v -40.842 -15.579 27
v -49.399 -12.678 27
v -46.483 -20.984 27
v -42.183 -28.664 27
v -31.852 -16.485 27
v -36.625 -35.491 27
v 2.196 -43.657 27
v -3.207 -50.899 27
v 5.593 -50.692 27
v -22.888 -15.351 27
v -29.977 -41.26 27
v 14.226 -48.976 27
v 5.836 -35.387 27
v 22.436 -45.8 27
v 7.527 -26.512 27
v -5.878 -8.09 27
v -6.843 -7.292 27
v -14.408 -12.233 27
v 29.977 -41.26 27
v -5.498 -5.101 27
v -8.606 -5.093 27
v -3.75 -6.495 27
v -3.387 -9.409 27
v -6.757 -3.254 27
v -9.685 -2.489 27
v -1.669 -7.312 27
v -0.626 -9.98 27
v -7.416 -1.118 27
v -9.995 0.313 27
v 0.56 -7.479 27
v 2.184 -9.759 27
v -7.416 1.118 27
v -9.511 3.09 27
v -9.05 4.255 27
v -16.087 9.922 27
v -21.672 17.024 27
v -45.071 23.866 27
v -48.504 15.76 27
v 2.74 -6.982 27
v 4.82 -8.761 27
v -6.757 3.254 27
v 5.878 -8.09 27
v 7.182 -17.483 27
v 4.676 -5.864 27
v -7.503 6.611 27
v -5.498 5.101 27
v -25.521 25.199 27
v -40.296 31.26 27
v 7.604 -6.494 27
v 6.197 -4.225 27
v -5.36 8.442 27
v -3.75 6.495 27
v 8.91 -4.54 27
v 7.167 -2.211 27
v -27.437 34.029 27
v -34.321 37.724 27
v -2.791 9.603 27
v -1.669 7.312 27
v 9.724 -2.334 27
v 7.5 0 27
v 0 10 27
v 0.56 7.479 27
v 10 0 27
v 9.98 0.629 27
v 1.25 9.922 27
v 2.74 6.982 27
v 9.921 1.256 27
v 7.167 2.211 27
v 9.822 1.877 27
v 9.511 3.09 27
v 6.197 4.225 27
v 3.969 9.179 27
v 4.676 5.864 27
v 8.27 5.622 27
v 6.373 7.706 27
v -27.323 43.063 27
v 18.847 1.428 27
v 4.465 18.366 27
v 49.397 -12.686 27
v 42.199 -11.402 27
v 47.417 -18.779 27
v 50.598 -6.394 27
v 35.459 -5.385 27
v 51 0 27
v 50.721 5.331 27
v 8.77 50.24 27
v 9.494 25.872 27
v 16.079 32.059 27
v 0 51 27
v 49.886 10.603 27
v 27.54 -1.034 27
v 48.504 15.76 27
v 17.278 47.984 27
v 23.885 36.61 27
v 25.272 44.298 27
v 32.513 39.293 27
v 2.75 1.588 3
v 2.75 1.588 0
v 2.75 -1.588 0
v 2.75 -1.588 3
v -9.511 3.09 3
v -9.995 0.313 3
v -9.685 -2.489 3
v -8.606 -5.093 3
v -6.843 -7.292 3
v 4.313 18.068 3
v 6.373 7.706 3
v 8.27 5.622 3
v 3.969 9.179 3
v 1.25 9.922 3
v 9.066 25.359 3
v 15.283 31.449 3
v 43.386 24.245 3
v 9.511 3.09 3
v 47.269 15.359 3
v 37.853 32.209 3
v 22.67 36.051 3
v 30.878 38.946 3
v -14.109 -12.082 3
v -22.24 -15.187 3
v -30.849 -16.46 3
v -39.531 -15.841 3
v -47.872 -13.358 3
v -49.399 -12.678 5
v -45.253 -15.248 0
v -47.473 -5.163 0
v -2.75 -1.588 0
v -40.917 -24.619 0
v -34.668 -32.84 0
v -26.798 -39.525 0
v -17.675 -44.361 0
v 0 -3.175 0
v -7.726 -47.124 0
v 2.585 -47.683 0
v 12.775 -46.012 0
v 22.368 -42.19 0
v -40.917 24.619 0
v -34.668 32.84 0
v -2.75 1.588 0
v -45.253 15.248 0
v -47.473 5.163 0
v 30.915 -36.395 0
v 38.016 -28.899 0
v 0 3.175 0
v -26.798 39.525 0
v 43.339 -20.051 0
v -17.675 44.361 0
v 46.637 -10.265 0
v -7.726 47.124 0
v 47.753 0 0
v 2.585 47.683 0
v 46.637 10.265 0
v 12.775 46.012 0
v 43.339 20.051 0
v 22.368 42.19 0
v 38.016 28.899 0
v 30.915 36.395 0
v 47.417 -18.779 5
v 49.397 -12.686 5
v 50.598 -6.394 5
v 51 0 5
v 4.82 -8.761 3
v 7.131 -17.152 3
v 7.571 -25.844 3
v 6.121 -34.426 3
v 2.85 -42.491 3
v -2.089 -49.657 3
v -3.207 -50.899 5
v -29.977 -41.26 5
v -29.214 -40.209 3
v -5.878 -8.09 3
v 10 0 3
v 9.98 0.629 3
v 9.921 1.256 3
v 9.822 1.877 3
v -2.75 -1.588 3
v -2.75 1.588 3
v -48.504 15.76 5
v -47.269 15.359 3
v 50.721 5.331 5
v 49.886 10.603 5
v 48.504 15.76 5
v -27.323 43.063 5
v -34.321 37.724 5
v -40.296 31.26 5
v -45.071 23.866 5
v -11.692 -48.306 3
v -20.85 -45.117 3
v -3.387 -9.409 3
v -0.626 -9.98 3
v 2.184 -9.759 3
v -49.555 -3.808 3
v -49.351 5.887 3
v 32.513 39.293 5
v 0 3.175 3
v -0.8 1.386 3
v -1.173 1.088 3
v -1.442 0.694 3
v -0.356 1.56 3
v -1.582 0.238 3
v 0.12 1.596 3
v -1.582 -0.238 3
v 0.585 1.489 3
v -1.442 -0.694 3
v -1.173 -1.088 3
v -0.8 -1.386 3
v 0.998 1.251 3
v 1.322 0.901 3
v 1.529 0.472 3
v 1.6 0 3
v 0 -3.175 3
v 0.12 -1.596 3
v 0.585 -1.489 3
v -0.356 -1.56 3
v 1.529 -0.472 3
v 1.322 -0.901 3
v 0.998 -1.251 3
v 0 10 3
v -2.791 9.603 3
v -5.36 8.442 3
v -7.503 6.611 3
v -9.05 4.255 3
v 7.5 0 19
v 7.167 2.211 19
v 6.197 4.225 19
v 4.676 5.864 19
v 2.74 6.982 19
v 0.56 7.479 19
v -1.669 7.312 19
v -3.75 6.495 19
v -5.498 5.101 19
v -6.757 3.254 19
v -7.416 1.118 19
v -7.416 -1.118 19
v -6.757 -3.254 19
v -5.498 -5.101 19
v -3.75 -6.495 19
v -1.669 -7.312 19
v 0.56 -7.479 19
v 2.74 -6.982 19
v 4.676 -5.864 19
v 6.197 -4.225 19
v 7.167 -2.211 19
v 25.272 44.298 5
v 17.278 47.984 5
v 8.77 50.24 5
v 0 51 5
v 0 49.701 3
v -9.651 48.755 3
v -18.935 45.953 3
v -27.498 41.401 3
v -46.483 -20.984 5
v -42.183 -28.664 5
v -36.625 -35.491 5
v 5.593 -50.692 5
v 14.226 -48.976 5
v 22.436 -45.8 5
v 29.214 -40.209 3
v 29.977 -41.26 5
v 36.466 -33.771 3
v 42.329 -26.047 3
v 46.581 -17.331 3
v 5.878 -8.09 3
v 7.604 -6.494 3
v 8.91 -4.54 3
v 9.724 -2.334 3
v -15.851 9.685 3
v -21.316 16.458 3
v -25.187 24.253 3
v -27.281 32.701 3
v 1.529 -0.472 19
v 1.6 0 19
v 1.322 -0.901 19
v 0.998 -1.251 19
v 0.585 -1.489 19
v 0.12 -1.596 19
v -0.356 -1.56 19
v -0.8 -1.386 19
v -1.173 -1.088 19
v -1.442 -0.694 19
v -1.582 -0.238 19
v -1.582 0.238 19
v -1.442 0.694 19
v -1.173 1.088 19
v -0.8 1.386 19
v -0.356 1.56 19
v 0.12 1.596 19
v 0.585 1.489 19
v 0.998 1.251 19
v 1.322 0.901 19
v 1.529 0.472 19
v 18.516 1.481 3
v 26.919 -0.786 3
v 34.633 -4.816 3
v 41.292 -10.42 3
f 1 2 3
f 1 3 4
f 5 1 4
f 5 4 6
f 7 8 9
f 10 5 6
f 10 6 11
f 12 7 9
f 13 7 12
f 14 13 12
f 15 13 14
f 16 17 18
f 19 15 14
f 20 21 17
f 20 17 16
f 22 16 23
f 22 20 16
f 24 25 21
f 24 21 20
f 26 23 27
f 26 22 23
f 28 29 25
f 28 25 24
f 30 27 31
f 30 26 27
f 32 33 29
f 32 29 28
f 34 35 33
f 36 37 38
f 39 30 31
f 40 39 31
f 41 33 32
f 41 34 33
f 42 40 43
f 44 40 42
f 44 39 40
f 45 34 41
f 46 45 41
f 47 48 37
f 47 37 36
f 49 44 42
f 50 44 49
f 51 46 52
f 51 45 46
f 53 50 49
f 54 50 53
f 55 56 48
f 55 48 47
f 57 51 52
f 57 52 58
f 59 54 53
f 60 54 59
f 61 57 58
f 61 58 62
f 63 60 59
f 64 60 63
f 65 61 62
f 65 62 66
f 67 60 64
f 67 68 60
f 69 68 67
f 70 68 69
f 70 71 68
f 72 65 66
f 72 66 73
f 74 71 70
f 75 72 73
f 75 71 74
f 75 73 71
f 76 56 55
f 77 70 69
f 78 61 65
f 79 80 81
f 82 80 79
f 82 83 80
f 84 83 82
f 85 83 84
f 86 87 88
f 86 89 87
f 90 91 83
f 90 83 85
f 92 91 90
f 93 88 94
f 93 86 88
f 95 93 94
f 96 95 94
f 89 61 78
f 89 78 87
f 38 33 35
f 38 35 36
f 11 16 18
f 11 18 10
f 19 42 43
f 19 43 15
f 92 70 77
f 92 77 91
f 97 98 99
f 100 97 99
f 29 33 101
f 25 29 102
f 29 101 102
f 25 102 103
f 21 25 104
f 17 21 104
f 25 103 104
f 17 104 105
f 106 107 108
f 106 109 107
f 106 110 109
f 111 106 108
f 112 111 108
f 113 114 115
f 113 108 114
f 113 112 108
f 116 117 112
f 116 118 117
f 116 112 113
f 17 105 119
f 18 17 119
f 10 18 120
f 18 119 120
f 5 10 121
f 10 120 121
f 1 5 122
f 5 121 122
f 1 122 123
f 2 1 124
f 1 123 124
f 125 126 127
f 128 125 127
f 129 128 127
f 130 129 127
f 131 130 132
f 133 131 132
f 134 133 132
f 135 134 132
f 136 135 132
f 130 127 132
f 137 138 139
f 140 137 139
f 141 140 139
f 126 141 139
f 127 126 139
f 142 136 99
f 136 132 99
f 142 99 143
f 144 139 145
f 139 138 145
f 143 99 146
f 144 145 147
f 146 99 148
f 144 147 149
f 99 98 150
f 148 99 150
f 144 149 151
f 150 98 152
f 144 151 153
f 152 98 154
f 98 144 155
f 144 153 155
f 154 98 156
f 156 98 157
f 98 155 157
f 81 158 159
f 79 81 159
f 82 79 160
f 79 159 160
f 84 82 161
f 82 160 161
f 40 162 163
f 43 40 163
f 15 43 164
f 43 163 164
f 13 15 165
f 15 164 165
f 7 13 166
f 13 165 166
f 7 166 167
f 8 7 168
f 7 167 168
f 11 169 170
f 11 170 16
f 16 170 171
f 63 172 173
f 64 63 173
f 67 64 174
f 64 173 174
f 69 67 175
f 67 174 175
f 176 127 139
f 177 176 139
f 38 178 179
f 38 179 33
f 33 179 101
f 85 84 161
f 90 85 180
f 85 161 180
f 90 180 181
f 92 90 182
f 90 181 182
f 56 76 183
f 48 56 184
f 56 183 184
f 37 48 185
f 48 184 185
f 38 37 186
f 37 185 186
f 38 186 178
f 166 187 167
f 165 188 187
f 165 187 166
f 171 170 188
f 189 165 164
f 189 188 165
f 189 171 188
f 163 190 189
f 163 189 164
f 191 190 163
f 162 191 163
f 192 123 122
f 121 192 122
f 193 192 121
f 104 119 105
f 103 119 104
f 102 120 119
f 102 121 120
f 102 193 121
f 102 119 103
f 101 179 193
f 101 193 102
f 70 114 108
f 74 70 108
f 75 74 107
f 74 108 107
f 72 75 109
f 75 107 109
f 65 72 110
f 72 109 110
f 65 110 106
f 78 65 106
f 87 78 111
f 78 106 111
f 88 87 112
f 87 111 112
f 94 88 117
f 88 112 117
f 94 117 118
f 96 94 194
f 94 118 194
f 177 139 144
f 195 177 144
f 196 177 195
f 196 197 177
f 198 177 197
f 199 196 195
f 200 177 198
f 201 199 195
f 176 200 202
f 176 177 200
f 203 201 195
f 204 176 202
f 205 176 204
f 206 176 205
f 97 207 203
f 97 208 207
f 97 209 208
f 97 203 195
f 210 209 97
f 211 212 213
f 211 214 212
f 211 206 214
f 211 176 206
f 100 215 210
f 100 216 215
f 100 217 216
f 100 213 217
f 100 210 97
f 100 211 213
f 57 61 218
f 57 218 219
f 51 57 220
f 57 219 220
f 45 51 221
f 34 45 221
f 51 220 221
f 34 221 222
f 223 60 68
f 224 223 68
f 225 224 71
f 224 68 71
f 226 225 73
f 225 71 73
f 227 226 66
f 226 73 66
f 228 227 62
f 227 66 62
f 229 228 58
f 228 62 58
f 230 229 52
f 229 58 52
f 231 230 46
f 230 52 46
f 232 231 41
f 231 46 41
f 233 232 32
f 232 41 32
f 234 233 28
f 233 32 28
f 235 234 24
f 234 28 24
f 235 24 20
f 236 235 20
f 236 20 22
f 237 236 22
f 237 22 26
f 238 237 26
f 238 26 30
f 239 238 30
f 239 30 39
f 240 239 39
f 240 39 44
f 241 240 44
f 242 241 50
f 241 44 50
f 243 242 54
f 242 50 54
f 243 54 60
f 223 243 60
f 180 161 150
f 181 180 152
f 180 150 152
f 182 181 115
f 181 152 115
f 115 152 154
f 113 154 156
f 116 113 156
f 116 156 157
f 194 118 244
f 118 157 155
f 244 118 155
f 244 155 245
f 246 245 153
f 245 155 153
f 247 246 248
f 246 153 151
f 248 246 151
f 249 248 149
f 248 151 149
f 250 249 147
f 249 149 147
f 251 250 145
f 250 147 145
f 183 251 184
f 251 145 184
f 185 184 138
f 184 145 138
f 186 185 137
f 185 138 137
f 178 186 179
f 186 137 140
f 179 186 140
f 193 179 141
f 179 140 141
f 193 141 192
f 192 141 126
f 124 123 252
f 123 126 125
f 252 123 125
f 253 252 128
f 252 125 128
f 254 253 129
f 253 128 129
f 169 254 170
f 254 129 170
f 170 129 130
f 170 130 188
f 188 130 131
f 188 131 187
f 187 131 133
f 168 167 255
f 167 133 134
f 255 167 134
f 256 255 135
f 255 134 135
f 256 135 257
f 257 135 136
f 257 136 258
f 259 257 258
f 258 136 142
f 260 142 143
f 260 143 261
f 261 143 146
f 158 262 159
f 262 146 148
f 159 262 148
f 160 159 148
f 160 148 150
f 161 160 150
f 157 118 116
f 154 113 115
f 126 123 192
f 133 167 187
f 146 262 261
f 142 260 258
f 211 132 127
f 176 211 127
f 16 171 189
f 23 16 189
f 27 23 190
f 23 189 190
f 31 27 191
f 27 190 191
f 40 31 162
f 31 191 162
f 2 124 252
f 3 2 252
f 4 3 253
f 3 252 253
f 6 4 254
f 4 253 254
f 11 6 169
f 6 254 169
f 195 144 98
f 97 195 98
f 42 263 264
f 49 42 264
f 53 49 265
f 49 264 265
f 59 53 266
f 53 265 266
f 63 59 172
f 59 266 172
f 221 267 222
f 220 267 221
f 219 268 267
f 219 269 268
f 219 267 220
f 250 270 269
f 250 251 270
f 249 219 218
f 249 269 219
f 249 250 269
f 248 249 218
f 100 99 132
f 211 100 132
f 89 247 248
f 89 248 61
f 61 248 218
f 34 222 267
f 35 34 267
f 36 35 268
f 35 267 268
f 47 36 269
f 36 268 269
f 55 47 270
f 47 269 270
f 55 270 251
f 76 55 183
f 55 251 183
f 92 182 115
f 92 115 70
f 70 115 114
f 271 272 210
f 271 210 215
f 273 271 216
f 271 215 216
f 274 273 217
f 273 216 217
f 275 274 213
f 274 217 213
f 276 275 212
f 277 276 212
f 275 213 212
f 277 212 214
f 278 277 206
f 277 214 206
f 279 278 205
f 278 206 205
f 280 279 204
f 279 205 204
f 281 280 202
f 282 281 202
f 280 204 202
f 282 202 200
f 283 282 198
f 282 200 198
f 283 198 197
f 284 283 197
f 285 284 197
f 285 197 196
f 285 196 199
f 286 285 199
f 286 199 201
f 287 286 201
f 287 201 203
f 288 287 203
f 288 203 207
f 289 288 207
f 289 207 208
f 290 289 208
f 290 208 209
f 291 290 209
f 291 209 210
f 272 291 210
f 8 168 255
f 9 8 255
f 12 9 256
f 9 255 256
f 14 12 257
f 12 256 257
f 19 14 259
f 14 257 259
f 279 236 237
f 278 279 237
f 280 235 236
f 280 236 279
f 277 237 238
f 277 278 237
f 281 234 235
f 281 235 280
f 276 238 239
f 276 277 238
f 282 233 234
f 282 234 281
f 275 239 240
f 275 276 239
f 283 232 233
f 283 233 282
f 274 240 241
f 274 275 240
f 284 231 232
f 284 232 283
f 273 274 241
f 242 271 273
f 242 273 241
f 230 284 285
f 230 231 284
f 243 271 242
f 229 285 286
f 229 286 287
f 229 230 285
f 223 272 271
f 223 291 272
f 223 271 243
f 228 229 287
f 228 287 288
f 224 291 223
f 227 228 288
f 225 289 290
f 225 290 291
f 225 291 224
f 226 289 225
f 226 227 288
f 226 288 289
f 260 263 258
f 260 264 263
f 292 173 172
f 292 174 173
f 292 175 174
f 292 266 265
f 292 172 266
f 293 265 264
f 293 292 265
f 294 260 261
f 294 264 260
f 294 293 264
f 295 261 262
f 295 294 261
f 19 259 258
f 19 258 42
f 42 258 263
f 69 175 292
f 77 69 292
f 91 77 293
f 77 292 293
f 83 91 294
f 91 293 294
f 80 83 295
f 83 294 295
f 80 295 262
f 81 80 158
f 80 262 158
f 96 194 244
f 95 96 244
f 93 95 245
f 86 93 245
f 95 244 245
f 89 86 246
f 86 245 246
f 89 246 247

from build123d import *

# Parameters (mm, degrees)
F0_R     = 51
F1_DEPTH = 3
F3_DEPTH = 24
F5_DEPTH = 3
F6_R     = 1.6
F7_DEPTH = 24.001
F8_R     = 7.5
F9_DEPTH = 8


# Not quite as in the source:
# - a fillet or chamfer that OpenCascade refuses, or shapes differently, is made with other operations: its cross-section is extruded or revolved along the edge and cut away or added


with BuildPart() as f1:
    # F0 (on Top) → F1 (new body)
    with BuildSketch(Plane.XY):
        Circle(F0_R)
    extrude(amount=F1_DEPTH)

    # F2 (on face) → F3 (join)
    with BuildSketch(Plane.XY.offset(3)):
        with BuildLine():
            Line((0, 51), (0, 10))
            ThreePointArc((0, 10), (0.6262291254, 9.9803725924), (1.25, 9.9215674165))
            ThreePointArc((1.25, 9.9215674165), (12.6111994349, 29.1522486886), (32.5125, 39.2929681209))
            ThreePointArc((32.5125, 39.2929681209), (17.2780008368, 47.9840670127), (0, 51))
        make_face()
        with BuildLine():
            Line((48.5038823311, 15.7598667131), (9.510565163, 3.0901699437))
            ThreePointArc((9.510565163, 3.0901699437), (9.6854138312, 2.4885254508), (9.8222425863, 1.8771122972))
            ThreePointArc((9.8222425863, 1.8771122972), (31.6225110248, -2.9854231318), (47.4167484056, -18.7790300773))
            ThreePointArc((47.4167484056, -18.7790300773), (50.0961783407, -9.5589181217), (51, 0))
            ThreePointArc((51, 0), (50.3721053704, 7.9781577171), (48.5038823311, 15.7598667131))
        make_face()
        with BuildLine():
            Line((29.9770478669, -41.2598667131), (5.8778525229, -8.0901699437))
            ThreePointArc((5.8778525229, -8.0901699437), (5.3596858173, -8.4423792819), (4.8204797641, -8.7614482161))
            ThreePointArc((4.8204797641, -8.7614482161), (6.9325871881, -30.9973416549), (-3.2073378494, -50.8990469844))
            ThreePointArc((-3.2073378494, -50.8990469844), (14.2261306293, -48.9756797535), (29.9770478669, -41.2598667131))
        make_face()
        with BuildLine():
            Line((-29.9770478669, -41.2598667131), (-5.8778525229, -8.0901699437))
            ThreePointArc((-5.8778525229, -8.0901699437), (-6.372945827, -7.7062027929), (-6.84302225, -7.2919850854))
            ThreePointArc((-6.84302225, -7.2919850854), (-27.3379365126, -16.1719875718), (-49.3989922099, -12.6783109541))
            ThreePointArc((-49.3989922099, -12.6783109541), (-42.1825232409, -28.6641715916), (-29.9770478669, -41.2598667131))
        make_face()
        with BuildLine():
            Line((-48.5038823311, 15.7598667131), (-9.510565163, 3.0901699437))
            ThreePointArc((-9.510565163, 3.0901699437), (-9.2983829469, 3.6796840317), (-9.0497001003, 4.2547535879))
            ThreePointArc((-9.0497001003, 4.2547535879), (-23.8283611351, 21.0025036698), (-27.3229183463, 43.0634198948))
            ThreePointArc((-27.3229183463, 43.0634198948), (-40.2963637234, 31.2602474506), (-48.5038823311, 15.7598667131))
        make_face()
        with BuildLine():
            ThreePointArc((-9.0497001003, 4.2547535879), (-4.6583345766, 1.8434602504), (0, 0))
            Line((0, 0), (0, 10))
            ThreePointArc((0, 10), (-5.3596858173, 8.4423792819), (-9.0497001003, 4.2547535879))
        make_face()
        with BuildLine():
            Line((-9.510565163, 3.0901699437), (0, 0))
            ThreePointArc((0, 0), (-4.6583345766, 1.8434602504), (-9.0497001003, 4.2547535879))
            ThreePointArc((-9.0497001003, 4.2547535879), (-9.2983829469, 3.6796840317), (-9.510565163, 3.0901699437))
        make_face()
        with BuildLine():
            ThreePointArc((-6.84302225, -7.2919850854), (-3.1927394333, -3.8606789083), (0, 0))
            Line((0, 0), (-9.510565163, 3.0901699437))
            ThreePointArc((-9.510565163, 3.0901699437), (-9.6854138312, -2.4885254508), (-6.84302225, -7.2919850854))
        make_face()
        with BuildLine():
            ThreePointArc((4.8204797641, -8.7614482161), (2.6851130896, -4.2294910354), (0, 0))
            Line((0, 0), (-5.8778525229, -8.0901699437))
            ThreePointArc((-5.8778525229, -8.0901699437), (-0.6262291254, -9.9803725924), (4.8204797641, -8.7614482161))
        make_face()
        with BuildLine():
            Line((-5.8778525229, -8.0901699437), (0, 0))
            ThreePointArc((0, 0), (-3.1927394333, -3.8606789083), (-6.84302225, -7.2919850854))
            ThreePointArc((-6.84302225, -7.2919850854), (-6.372945827, -7.7062027929), (-5.8778525229, -8.0901699437))
        make_face()
        with BuildLine():
            Line((5.8778525229, -8.0901699437), (0, 0))
            ThreePointArc((0, 0), (2.6851130896, -4.2294910354), (4.8204797641, -8.7614482161))
            ThreePointArc((4.8204797641, -8.7614482161), (5.3596858173, -8.4423792819), (5.8778525229, -8.0901699437))
        make_face()
        with BuildLine():
            ThreePointArc((9.8222425863, 1.8771122972), (4.8522305863, 1.2467096933), (0, 0))
            Line((0, 0), (5.8778525229, -8.0901699437))
            ThreePointArc((5.8778525229, -8.0901699437), (8.9100652419, -4.5399049974), (10, 0))
            ThreePointArc((10, 0), (9.9554614625, 0.9427550417), (9.8222425863, 1.8771122972))
        make_face()
        with BuildLine():
            Line((9.510565163, 3.0901699437), (0, 0))
            ThreePointArc((0, 0), (4.8522305863, 1.2467096933), (9.8222425863, 1.8771122972))
            ThreePointArc((9.8222425863, 1.8771122972), (9.6854138312, 2.4885254508), (9.510565163, 3.0901699437))
        make_face()
        with BuildLine():
            ThreePointArc((1.25, 9.9215674165), (0.313730334, 5), (0, 0))
            Line((0, 0), (9.510565163, 3.0901699437))
            ThreePointArc((9.510565163, 3.0901699437), (6.372945827, 7.7062027929), (1.25, 9.9215674165))
        make_face()
        with BuildLine():
            Line((0, 10), (0, 0))
            ThreePointArc((0, 0), (0.313730334, 5), (1.25, 9.9215674165))
            ThreePointArc((1.25, 9.9215674165), (0.6262291254, 9.9803725924), (0, 10))
        make_face()
    extrude(amount=F3_DEPTH)

    # F4 (on face) → F5 (cut)
    with BuildSketch(Plane(origin=(0, 0, 0), x_dir=(1, 0, 0), z_dir=(0, 0, -1))):
        Polygon((2.75, -1.5877132403), (2.75, 1.5877132403), (0, 3.1754264805), (-2.75, 1.5877132403), (-2.75, -1.5877132403), (0, -3.1754264805), align=None)
    extrude(amount=-F5_DEPTH, mode=Mode.SUBTRACT)

    # F6 (on face) → F7 (cut, through all)
    with BuildSketch(Plane(origin=(0, 0, 3), x_dir=(1, 0, 0), z_dir=(0, 0, -1))):
        Circle(F6_R)
    extrude(amount=-F7_DEPTH, mode=Mode.SUBTRACT)

    # F8 (on face) → F9 (cut)
    with BuildSketch(Plane.XY.offset(27)):
        Circle(F8_R)
    extrude(amount=-F9_DEPTH, mode=Mode.SUBTRACT)

    # F10: chamfer of 5 x 3.247037966 on 1 edges, made by hand

    # F10_s1 → F10_t2 (revolve, cut)
    with BuildSketch(Plane.XZ):
        Polygon((51, 5), (47.752962034, 0), (51, 0), align=None)
    revolve(axis=Axis((0, 0, 0), (0, 0, 1)), mode=Mode.SUBTRACT)


solid = f1.part
